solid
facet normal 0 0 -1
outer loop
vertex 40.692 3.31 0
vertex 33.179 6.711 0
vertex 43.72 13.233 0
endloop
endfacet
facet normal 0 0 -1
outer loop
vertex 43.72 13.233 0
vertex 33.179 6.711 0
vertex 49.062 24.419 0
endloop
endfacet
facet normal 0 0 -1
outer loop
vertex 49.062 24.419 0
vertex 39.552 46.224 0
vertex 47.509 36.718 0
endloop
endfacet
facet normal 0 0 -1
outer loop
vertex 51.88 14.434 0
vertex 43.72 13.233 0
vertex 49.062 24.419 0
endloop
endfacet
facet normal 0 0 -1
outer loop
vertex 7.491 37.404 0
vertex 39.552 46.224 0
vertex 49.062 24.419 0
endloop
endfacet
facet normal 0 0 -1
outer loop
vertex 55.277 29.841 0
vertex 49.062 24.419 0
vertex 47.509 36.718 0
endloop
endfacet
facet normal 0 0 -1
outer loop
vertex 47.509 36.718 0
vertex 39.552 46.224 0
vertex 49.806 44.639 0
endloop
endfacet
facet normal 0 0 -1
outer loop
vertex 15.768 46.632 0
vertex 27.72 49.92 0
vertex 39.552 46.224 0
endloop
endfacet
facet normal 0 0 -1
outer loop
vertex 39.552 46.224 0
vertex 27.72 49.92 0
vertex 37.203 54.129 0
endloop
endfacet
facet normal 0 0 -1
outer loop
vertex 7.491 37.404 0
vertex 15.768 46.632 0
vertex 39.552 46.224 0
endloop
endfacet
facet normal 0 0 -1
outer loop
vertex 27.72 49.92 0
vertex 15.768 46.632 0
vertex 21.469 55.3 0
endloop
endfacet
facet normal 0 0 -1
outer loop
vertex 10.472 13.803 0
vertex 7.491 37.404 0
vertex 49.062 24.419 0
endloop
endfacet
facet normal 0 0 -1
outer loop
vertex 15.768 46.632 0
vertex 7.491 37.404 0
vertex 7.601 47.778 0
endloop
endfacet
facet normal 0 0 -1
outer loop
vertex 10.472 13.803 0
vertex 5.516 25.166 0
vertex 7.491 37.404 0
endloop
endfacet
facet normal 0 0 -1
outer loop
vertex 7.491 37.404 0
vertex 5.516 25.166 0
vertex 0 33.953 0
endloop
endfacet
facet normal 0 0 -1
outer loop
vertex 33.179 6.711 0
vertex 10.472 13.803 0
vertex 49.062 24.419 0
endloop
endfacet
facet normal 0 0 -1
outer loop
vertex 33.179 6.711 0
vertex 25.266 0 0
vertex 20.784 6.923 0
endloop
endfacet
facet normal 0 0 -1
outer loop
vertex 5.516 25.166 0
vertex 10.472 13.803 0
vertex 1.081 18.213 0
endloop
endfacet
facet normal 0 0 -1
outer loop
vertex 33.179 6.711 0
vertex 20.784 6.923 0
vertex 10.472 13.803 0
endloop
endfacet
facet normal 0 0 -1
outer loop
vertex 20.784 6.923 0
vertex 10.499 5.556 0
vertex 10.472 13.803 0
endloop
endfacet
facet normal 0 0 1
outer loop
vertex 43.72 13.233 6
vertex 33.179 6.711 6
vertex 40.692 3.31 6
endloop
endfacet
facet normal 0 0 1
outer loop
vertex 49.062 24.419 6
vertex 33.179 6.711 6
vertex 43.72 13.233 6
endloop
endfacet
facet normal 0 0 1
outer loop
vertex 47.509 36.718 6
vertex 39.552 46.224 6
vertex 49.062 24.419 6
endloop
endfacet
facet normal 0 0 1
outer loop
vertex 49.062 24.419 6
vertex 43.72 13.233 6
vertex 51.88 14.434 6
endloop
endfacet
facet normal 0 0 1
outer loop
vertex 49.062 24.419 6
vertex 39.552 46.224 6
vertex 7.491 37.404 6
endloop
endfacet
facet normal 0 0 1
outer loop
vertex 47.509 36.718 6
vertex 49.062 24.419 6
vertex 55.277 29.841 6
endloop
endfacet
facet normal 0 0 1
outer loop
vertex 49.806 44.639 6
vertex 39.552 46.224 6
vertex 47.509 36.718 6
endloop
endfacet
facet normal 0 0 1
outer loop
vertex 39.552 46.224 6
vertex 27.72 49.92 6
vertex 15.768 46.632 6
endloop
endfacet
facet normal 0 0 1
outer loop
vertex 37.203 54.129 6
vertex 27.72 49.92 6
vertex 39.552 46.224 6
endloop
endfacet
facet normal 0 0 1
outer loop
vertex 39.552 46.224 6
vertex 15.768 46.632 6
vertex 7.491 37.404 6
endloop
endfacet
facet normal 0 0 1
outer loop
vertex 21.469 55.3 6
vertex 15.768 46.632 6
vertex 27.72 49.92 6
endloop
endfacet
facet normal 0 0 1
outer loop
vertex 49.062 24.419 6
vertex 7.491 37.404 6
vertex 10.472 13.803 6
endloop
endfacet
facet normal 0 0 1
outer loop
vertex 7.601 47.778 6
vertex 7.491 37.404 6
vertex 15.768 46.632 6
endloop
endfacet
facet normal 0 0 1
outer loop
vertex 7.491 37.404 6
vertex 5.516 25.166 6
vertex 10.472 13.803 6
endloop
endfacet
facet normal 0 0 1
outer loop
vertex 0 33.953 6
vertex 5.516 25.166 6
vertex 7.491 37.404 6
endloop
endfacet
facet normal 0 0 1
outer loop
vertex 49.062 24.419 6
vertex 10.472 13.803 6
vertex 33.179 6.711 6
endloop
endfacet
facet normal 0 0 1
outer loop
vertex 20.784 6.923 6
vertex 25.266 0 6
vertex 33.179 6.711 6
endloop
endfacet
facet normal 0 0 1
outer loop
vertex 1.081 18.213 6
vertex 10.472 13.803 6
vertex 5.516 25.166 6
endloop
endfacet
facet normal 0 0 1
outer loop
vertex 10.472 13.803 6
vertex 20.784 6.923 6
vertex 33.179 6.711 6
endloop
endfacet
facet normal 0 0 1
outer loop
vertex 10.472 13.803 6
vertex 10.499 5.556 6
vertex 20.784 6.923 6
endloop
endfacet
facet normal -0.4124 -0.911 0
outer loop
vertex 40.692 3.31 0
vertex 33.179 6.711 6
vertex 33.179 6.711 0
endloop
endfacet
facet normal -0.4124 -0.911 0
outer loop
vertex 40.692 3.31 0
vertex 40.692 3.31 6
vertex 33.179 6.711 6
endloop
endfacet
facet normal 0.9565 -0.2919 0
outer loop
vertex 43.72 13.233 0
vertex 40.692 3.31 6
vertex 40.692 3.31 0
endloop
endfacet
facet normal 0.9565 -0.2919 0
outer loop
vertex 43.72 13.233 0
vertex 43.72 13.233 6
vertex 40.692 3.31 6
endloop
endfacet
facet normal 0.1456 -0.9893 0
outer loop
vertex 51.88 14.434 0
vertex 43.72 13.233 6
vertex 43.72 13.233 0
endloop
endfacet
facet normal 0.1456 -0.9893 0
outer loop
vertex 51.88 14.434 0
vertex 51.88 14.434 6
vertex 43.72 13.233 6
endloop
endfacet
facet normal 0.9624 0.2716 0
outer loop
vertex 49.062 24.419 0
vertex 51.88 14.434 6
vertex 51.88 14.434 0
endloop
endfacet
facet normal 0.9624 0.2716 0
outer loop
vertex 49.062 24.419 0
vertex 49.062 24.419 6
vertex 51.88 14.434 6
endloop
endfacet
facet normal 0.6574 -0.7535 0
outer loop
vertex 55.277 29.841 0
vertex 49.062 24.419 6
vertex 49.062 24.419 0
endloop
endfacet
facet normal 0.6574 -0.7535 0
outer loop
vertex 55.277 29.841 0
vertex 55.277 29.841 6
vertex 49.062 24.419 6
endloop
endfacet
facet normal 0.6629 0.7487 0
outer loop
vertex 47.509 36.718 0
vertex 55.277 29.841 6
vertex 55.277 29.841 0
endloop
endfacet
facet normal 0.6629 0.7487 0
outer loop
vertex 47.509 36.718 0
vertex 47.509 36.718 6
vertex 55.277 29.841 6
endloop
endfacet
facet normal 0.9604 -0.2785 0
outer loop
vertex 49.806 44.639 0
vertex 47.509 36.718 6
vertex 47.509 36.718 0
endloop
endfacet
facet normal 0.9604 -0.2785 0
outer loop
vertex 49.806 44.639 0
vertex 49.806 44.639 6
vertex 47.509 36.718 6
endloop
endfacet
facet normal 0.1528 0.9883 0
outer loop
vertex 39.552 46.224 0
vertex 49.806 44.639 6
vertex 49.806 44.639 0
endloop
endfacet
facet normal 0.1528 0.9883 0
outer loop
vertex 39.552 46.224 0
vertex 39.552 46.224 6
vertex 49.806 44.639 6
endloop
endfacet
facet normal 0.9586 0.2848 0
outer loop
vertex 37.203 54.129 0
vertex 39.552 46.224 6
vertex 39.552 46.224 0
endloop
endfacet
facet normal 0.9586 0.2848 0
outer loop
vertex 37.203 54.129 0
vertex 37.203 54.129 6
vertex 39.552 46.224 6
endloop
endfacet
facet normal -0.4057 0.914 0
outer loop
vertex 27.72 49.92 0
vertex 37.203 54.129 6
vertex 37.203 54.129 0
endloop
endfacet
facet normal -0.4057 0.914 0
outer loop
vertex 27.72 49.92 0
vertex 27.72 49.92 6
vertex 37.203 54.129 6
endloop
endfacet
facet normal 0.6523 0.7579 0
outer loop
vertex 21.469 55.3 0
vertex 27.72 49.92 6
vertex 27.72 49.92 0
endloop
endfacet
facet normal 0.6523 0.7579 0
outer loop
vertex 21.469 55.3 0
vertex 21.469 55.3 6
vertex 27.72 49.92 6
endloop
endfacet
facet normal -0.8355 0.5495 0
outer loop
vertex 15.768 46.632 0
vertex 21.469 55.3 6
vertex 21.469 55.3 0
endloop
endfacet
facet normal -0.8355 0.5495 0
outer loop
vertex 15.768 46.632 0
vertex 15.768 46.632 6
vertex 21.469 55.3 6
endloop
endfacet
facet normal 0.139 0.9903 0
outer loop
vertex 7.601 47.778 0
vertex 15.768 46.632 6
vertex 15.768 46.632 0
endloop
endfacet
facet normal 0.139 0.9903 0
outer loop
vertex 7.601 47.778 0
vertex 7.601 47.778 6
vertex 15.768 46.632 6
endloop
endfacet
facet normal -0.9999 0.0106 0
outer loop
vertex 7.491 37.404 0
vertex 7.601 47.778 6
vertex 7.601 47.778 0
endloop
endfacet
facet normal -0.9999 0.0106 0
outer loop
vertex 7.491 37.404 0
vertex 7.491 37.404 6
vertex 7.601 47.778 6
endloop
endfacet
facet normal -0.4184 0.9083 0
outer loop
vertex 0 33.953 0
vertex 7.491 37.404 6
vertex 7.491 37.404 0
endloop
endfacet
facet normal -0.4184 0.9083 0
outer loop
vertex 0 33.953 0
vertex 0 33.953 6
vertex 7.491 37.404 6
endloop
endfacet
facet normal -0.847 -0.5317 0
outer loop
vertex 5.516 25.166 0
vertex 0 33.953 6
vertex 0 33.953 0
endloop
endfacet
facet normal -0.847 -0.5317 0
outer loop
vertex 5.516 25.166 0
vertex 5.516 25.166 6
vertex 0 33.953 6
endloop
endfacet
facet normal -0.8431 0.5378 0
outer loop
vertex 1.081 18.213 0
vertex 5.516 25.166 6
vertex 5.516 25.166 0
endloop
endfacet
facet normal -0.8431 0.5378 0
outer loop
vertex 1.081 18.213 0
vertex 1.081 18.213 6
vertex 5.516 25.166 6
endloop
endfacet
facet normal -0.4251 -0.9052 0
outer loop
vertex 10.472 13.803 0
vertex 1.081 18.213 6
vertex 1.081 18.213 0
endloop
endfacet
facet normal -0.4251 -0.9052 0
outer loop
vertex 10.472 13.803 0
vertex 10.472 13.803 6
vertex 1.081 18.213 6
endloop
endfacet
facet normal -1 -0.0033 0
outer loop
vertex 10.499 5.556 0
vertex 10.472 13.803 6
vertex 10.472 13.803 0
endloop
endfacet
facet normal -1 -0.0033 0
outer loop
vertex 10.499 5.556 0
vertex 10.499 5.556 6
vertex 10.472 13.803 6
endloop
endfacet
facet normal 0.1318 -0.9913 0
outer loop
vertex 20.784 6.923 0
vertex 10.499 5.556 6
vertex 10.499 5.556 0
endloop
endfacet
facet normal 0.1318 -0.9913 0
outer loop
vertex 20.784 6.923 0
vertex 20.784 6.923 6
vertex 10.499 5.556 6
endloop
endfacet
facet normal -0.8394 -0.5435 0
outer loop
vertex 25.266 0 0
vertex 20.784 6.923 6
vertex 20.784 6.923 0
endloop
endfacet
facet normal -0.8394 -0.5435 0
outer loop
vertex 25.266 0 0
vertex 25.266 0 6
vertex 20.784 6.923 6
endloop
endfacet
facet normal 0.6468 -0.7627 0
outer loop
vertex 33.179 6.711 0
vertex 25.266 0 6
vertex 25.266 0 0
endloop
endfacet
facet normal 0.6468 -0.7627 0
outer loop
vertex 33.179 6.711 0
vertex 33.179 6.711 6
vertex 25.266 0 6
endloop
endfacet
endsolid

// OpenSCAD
$fn = 32;

// ----------------------------------------------------------------------
// Chain sprocket: 11 teeth, 22 mm root radius
// ----------------------------------------------------------------------

// --- parameters (mm) ---
profile_height = 6;       // extrusion height
profile_points = 22;      // points of the closed outline

profile = [[49.062, 24.419], [55.277, 29.841], [47.509, 36.718], [49.806, 44.639], [39.552, 46.224], [37.203, 54.129], [27.72, 49.92], [21.469, 55.3], [15.768, 46.632], [7.601, 47.778], [7.491, 37.404], [0, 33.953], [5.516, 25.166], [1.081, 18.213], [10.472, 13.803], [10.499, 5.556], [20.784, 6.923], [25.266, 0], [33.179, 6.711], [40.692, 3.31], [43.72, 13.233], [51.88, 14.434]];  // single closed polygon, 22 points, counter clockwise

// --- the one profile operation ---
linear_extrude(height = profile_height) polygon(points = profile);
